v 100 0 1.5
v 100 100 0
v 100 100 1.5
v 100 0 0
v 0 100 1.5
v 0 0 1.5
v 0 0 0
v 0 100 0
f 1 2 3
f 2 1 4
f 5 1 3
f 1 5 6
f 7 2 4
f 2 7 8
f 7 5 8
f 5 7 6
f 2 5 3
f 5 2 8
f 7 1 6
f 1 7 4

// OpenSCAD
module breadboard(width, length){
    
    
    
    
    
    rows = length / 2;
    columns = width / 2;
    difference(){
        cube([length, width, 1.5]);
        union(){
            for( i = [0 : rows]){
                for (j = [0 : columns]){
                   // translate([i*2,j*2,0]) cylinder(r=0.5, h=5, center=true);
                }
            }
        }
    }
    
}

breadboard(100,100);
